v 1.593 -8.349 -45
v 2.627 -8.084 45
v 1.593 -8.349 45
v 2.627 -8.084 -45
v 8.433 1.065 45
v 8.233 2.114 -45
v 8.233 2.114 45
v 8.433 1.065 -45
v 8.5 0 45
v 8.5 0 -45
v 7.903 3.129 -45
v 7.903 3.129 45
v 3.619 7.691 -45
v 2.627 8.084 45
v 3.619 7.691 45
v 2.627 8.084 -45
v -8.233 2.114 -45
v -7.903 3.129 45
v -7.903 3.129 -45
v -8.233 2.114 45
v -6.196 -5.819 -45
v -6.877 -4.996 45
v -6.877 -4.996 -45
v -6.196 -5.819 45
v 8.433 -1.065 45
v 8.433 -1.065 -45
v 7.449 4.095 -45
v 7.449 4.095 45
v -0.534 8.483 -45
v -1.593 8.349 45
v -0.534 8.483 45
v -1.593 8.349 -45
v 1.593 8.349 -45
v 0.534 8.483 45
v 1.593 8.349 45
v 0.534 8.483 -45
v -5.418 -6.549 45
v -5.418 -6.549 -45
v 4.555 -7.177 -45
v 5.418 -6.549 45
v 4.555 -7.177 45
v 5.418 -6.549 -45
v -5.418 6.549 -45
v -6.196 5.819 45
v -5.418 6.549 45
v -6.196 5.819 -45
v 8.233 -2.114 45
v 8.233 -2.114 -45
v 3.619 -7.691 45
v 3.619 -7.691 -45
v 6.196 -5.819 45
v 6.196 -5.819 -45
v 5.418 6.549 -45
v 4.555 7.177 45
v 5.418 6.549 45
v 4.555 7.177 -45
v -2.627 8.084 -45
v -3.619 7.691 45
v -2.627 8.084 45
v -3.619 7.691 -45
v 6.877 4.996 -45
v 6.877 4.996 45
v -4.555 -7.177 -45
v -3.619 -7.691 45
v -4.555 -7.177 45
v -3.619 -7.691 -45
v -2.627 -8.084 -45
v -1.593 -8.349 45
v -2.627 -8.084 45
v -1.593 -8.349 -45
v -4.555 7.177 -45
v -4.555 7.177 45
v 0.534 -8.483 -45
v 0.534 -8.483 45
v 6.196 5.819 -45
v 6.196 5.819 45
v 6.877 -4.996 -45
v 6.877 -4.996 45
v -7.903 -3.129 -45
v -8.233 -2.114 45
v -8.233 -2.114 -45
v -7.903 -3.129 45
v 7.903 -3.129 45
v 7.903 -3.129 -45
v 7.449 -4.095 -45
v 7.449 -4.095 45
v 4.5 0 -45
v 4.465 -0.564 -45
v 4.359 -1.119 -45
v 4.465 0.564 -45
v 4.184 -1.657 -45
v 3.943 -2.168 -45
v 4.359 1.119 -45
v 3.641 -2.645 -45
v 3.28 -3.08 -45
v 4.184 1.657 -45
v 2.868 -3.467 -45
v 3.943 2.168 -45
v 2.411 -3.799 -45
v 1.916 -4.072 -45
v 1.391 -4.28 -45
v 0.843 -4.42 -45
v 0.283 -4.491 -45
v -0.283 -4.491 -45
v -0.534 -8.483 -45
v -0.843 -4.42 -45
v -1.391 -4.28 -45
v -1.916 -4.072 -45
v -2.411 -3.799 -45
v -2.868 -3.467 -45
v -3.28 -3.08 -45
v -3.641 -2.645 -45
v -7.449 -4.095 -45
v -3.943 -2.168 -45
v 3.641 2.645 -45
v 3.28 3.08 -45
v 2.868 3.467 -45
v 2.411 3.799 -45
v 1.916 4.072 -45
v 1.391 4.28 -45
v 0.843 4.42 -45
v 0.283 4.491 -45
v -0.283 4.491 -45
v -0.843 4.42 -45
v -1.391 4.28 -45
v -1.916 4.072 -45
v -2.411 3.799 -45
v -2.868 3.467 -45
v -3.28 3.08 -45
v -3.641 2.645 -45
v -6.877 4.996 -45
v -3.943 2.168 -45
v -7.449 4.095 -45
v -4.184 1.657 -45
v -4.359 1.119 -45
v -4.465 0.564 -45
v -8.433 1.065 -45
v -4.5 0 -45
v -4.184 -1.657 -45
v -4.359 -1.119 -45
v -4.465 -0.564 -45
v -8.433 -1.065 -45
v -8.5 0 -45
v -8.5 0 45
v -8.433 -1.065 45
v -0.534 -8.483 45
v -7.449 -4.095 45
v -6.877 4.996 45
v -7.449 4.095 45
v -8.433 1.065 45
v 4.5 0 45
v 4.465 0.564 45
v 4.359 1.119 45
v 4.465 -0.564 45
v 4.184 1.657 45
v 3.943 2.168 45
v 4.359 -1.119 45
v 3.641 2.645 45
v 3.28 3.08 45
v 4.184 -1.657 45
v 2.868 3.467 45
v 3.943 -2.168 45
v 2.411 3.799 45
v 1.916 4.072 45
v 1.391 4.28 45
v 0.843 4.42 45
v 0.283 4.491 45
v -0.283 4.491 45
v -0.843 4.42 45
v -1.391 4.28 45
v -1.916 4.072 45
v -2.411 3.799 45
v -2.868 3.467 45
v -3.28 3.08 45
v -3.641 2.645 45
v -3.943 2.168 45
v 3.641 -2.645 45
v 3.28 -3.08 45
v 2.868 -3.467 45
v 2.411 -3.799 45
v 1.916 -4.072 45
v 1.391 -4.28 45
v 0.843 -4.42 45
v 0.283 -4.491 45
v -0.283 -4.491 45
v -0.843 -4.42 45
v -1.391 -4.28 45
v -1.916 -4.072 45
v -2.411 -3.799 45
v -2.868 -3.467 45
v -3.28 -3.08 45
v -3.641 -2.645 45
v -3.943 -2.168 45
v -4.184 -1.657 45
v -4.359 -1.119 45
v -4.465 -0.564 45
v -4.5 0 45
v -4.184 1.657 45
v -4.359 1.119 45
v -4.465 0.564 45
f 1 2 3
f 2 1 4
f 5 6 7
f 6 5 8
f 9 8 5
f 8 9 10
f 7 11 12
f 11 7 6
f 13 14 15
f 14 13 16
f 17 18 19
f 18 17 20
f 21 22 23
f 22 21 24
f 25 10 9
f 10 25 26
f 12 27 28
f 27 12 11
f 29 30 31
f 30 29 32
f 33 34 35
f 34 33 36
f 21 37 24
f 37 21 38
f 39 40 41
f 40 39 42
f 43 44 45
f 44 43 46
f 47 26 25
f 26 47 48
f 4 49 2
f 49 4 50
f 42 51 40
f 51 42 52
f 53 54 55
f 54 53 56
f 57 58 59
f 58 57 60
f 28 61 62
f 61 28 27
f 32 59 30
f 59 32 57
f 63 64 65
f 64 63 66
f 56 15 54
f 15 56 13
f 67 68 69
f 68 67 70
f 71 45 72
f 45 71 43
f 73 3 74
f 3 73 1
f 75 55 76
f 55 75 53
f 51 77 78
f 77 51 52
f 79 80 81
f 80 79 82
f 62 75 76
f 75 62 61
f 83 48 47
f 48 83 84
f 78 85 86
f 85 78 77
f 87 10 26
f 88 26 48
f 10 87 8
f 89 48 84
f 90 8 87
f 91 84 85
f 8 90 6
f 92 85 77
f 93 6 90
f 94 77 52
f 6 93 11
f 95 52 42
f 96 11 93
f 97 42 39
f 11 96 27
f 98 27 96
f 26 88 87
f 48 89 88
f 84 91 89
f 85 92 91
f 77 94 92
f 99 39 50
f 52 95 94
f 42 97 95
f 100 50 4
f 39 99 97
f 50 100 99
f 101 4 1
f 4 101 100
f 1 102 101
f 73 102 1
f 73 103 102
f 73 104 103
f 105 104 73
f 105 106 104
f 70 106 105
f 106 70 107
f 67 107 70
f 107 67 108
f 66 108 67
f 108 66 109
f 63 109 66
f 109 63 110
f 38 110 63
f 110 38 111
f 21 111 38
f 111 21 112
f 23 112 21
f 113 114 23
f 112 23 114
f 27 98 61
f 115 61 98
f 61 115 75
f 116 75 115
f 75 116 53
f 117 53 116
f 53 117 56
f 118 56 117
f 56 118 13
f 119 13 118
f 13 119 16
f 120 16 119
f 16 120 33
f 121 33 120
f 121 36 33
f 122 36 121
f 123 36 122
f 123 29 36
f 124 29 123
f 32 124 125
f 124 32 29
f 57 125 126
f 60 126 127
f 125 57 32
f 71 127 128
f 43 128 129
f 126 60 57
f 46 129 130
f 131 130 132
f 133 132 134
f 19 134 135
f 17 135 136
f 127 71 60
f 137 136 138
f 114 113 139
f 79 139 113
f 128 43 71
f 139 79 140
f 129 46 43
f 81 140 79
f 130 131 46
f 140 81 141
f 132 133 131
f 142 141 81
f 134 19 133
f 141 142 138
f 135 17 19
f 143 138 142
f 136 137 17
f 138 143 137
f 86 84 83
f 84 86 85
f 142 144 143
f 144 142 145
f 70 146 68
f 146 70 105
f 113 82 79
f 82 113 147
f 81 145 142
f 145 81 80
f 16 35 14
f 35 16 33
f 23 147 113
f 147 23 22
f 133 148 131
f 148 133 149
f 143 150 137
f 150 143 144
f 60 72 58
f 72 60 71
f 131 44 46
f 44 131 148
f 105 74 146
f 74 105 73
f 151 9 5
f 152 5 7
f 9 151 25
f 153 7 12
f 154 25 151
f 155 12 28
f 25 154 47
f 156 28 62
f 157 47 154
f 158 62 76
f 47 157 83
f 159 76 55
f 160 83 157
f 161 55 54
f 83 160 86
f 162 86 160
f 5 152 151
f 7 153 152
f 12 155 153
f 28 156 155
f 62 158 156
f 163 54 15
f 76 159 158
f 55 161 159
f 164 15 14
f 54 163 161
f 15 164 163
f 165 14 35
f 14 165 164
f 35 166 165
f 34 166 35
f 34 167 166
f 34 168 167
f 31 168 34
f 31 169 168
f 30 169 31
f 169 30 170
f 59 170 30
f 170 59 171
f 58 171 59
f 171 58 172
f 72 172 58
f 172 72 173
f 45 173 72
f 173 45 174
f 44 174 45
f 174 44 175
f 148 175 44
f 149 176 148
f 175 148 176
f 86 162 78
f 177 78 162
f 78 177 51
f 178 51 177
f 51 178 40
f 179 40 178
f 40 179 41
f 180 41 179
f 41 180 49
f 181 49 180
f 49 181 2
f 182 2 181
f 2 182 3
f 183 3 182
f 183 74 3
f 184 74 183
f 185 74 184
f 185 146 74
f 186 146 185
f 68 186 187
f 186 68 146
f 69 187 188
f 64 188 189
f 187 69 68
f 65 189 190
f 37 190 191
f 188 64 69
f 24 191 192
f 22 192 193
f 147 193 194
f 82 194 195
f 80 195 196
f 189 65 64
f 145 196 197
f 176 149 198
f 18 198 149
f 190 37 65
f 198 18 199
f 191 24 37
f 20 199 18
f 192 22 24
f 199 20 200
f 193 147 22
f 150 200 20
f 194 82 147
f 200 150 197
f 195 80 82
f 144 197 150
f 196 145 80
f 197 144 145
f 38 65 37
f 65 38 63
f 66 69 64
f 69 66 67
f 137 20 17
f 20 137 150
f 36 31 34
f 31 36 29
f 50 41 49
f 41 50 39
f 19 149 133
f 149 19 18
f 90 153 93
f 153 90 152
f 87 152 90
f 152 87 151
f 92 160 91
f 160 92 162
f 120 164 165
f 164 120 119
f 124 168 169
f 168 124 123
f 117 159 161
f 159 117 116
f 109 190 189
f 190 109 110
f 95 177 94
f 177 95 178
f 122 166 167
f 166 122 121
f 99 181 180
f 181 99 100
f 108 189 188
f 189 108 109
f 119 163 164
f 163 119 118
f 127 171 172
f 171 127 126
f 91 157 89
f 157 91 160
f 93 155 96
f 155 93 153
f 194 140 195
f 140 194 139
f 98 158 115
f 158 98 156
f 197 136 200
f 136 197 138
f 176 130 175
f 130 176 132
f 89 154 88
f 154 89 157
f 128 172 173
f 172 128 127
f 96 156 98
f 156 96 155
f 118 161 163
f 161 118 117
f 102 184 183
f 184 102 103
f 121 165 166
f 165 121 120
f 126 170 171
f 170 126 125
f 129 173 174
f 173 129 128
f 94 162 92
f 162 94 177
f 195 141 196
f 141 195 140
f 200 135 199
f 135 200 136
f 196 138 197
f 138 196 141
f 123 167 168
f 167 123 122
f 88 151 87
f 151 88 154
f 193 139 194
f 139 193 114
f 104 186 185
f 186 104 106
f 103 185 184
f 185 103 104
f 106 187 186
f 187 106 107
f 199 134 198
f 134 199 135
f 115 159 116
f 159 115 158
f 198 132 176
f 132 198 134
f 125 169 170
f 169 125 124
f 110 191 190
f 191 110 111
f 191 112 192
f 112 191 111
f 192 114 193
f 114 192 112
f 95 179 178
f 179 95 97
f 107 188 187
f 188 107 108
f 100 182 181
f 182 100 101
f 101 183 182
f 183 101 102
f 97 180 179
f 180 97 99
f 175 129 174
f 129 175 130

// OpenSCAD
$fn = 50;


difference() {
	union() {
		translate(v = [0, 0, -45.0000000000]) {
			cylinder(h = 90, r = 8.5000000000);
		}
	}
	union() {
		translate(v = [0, 0, -100.0000000000]) {
			cylinder(h = 200, r = 4.5000000000);
		}
	}
}
